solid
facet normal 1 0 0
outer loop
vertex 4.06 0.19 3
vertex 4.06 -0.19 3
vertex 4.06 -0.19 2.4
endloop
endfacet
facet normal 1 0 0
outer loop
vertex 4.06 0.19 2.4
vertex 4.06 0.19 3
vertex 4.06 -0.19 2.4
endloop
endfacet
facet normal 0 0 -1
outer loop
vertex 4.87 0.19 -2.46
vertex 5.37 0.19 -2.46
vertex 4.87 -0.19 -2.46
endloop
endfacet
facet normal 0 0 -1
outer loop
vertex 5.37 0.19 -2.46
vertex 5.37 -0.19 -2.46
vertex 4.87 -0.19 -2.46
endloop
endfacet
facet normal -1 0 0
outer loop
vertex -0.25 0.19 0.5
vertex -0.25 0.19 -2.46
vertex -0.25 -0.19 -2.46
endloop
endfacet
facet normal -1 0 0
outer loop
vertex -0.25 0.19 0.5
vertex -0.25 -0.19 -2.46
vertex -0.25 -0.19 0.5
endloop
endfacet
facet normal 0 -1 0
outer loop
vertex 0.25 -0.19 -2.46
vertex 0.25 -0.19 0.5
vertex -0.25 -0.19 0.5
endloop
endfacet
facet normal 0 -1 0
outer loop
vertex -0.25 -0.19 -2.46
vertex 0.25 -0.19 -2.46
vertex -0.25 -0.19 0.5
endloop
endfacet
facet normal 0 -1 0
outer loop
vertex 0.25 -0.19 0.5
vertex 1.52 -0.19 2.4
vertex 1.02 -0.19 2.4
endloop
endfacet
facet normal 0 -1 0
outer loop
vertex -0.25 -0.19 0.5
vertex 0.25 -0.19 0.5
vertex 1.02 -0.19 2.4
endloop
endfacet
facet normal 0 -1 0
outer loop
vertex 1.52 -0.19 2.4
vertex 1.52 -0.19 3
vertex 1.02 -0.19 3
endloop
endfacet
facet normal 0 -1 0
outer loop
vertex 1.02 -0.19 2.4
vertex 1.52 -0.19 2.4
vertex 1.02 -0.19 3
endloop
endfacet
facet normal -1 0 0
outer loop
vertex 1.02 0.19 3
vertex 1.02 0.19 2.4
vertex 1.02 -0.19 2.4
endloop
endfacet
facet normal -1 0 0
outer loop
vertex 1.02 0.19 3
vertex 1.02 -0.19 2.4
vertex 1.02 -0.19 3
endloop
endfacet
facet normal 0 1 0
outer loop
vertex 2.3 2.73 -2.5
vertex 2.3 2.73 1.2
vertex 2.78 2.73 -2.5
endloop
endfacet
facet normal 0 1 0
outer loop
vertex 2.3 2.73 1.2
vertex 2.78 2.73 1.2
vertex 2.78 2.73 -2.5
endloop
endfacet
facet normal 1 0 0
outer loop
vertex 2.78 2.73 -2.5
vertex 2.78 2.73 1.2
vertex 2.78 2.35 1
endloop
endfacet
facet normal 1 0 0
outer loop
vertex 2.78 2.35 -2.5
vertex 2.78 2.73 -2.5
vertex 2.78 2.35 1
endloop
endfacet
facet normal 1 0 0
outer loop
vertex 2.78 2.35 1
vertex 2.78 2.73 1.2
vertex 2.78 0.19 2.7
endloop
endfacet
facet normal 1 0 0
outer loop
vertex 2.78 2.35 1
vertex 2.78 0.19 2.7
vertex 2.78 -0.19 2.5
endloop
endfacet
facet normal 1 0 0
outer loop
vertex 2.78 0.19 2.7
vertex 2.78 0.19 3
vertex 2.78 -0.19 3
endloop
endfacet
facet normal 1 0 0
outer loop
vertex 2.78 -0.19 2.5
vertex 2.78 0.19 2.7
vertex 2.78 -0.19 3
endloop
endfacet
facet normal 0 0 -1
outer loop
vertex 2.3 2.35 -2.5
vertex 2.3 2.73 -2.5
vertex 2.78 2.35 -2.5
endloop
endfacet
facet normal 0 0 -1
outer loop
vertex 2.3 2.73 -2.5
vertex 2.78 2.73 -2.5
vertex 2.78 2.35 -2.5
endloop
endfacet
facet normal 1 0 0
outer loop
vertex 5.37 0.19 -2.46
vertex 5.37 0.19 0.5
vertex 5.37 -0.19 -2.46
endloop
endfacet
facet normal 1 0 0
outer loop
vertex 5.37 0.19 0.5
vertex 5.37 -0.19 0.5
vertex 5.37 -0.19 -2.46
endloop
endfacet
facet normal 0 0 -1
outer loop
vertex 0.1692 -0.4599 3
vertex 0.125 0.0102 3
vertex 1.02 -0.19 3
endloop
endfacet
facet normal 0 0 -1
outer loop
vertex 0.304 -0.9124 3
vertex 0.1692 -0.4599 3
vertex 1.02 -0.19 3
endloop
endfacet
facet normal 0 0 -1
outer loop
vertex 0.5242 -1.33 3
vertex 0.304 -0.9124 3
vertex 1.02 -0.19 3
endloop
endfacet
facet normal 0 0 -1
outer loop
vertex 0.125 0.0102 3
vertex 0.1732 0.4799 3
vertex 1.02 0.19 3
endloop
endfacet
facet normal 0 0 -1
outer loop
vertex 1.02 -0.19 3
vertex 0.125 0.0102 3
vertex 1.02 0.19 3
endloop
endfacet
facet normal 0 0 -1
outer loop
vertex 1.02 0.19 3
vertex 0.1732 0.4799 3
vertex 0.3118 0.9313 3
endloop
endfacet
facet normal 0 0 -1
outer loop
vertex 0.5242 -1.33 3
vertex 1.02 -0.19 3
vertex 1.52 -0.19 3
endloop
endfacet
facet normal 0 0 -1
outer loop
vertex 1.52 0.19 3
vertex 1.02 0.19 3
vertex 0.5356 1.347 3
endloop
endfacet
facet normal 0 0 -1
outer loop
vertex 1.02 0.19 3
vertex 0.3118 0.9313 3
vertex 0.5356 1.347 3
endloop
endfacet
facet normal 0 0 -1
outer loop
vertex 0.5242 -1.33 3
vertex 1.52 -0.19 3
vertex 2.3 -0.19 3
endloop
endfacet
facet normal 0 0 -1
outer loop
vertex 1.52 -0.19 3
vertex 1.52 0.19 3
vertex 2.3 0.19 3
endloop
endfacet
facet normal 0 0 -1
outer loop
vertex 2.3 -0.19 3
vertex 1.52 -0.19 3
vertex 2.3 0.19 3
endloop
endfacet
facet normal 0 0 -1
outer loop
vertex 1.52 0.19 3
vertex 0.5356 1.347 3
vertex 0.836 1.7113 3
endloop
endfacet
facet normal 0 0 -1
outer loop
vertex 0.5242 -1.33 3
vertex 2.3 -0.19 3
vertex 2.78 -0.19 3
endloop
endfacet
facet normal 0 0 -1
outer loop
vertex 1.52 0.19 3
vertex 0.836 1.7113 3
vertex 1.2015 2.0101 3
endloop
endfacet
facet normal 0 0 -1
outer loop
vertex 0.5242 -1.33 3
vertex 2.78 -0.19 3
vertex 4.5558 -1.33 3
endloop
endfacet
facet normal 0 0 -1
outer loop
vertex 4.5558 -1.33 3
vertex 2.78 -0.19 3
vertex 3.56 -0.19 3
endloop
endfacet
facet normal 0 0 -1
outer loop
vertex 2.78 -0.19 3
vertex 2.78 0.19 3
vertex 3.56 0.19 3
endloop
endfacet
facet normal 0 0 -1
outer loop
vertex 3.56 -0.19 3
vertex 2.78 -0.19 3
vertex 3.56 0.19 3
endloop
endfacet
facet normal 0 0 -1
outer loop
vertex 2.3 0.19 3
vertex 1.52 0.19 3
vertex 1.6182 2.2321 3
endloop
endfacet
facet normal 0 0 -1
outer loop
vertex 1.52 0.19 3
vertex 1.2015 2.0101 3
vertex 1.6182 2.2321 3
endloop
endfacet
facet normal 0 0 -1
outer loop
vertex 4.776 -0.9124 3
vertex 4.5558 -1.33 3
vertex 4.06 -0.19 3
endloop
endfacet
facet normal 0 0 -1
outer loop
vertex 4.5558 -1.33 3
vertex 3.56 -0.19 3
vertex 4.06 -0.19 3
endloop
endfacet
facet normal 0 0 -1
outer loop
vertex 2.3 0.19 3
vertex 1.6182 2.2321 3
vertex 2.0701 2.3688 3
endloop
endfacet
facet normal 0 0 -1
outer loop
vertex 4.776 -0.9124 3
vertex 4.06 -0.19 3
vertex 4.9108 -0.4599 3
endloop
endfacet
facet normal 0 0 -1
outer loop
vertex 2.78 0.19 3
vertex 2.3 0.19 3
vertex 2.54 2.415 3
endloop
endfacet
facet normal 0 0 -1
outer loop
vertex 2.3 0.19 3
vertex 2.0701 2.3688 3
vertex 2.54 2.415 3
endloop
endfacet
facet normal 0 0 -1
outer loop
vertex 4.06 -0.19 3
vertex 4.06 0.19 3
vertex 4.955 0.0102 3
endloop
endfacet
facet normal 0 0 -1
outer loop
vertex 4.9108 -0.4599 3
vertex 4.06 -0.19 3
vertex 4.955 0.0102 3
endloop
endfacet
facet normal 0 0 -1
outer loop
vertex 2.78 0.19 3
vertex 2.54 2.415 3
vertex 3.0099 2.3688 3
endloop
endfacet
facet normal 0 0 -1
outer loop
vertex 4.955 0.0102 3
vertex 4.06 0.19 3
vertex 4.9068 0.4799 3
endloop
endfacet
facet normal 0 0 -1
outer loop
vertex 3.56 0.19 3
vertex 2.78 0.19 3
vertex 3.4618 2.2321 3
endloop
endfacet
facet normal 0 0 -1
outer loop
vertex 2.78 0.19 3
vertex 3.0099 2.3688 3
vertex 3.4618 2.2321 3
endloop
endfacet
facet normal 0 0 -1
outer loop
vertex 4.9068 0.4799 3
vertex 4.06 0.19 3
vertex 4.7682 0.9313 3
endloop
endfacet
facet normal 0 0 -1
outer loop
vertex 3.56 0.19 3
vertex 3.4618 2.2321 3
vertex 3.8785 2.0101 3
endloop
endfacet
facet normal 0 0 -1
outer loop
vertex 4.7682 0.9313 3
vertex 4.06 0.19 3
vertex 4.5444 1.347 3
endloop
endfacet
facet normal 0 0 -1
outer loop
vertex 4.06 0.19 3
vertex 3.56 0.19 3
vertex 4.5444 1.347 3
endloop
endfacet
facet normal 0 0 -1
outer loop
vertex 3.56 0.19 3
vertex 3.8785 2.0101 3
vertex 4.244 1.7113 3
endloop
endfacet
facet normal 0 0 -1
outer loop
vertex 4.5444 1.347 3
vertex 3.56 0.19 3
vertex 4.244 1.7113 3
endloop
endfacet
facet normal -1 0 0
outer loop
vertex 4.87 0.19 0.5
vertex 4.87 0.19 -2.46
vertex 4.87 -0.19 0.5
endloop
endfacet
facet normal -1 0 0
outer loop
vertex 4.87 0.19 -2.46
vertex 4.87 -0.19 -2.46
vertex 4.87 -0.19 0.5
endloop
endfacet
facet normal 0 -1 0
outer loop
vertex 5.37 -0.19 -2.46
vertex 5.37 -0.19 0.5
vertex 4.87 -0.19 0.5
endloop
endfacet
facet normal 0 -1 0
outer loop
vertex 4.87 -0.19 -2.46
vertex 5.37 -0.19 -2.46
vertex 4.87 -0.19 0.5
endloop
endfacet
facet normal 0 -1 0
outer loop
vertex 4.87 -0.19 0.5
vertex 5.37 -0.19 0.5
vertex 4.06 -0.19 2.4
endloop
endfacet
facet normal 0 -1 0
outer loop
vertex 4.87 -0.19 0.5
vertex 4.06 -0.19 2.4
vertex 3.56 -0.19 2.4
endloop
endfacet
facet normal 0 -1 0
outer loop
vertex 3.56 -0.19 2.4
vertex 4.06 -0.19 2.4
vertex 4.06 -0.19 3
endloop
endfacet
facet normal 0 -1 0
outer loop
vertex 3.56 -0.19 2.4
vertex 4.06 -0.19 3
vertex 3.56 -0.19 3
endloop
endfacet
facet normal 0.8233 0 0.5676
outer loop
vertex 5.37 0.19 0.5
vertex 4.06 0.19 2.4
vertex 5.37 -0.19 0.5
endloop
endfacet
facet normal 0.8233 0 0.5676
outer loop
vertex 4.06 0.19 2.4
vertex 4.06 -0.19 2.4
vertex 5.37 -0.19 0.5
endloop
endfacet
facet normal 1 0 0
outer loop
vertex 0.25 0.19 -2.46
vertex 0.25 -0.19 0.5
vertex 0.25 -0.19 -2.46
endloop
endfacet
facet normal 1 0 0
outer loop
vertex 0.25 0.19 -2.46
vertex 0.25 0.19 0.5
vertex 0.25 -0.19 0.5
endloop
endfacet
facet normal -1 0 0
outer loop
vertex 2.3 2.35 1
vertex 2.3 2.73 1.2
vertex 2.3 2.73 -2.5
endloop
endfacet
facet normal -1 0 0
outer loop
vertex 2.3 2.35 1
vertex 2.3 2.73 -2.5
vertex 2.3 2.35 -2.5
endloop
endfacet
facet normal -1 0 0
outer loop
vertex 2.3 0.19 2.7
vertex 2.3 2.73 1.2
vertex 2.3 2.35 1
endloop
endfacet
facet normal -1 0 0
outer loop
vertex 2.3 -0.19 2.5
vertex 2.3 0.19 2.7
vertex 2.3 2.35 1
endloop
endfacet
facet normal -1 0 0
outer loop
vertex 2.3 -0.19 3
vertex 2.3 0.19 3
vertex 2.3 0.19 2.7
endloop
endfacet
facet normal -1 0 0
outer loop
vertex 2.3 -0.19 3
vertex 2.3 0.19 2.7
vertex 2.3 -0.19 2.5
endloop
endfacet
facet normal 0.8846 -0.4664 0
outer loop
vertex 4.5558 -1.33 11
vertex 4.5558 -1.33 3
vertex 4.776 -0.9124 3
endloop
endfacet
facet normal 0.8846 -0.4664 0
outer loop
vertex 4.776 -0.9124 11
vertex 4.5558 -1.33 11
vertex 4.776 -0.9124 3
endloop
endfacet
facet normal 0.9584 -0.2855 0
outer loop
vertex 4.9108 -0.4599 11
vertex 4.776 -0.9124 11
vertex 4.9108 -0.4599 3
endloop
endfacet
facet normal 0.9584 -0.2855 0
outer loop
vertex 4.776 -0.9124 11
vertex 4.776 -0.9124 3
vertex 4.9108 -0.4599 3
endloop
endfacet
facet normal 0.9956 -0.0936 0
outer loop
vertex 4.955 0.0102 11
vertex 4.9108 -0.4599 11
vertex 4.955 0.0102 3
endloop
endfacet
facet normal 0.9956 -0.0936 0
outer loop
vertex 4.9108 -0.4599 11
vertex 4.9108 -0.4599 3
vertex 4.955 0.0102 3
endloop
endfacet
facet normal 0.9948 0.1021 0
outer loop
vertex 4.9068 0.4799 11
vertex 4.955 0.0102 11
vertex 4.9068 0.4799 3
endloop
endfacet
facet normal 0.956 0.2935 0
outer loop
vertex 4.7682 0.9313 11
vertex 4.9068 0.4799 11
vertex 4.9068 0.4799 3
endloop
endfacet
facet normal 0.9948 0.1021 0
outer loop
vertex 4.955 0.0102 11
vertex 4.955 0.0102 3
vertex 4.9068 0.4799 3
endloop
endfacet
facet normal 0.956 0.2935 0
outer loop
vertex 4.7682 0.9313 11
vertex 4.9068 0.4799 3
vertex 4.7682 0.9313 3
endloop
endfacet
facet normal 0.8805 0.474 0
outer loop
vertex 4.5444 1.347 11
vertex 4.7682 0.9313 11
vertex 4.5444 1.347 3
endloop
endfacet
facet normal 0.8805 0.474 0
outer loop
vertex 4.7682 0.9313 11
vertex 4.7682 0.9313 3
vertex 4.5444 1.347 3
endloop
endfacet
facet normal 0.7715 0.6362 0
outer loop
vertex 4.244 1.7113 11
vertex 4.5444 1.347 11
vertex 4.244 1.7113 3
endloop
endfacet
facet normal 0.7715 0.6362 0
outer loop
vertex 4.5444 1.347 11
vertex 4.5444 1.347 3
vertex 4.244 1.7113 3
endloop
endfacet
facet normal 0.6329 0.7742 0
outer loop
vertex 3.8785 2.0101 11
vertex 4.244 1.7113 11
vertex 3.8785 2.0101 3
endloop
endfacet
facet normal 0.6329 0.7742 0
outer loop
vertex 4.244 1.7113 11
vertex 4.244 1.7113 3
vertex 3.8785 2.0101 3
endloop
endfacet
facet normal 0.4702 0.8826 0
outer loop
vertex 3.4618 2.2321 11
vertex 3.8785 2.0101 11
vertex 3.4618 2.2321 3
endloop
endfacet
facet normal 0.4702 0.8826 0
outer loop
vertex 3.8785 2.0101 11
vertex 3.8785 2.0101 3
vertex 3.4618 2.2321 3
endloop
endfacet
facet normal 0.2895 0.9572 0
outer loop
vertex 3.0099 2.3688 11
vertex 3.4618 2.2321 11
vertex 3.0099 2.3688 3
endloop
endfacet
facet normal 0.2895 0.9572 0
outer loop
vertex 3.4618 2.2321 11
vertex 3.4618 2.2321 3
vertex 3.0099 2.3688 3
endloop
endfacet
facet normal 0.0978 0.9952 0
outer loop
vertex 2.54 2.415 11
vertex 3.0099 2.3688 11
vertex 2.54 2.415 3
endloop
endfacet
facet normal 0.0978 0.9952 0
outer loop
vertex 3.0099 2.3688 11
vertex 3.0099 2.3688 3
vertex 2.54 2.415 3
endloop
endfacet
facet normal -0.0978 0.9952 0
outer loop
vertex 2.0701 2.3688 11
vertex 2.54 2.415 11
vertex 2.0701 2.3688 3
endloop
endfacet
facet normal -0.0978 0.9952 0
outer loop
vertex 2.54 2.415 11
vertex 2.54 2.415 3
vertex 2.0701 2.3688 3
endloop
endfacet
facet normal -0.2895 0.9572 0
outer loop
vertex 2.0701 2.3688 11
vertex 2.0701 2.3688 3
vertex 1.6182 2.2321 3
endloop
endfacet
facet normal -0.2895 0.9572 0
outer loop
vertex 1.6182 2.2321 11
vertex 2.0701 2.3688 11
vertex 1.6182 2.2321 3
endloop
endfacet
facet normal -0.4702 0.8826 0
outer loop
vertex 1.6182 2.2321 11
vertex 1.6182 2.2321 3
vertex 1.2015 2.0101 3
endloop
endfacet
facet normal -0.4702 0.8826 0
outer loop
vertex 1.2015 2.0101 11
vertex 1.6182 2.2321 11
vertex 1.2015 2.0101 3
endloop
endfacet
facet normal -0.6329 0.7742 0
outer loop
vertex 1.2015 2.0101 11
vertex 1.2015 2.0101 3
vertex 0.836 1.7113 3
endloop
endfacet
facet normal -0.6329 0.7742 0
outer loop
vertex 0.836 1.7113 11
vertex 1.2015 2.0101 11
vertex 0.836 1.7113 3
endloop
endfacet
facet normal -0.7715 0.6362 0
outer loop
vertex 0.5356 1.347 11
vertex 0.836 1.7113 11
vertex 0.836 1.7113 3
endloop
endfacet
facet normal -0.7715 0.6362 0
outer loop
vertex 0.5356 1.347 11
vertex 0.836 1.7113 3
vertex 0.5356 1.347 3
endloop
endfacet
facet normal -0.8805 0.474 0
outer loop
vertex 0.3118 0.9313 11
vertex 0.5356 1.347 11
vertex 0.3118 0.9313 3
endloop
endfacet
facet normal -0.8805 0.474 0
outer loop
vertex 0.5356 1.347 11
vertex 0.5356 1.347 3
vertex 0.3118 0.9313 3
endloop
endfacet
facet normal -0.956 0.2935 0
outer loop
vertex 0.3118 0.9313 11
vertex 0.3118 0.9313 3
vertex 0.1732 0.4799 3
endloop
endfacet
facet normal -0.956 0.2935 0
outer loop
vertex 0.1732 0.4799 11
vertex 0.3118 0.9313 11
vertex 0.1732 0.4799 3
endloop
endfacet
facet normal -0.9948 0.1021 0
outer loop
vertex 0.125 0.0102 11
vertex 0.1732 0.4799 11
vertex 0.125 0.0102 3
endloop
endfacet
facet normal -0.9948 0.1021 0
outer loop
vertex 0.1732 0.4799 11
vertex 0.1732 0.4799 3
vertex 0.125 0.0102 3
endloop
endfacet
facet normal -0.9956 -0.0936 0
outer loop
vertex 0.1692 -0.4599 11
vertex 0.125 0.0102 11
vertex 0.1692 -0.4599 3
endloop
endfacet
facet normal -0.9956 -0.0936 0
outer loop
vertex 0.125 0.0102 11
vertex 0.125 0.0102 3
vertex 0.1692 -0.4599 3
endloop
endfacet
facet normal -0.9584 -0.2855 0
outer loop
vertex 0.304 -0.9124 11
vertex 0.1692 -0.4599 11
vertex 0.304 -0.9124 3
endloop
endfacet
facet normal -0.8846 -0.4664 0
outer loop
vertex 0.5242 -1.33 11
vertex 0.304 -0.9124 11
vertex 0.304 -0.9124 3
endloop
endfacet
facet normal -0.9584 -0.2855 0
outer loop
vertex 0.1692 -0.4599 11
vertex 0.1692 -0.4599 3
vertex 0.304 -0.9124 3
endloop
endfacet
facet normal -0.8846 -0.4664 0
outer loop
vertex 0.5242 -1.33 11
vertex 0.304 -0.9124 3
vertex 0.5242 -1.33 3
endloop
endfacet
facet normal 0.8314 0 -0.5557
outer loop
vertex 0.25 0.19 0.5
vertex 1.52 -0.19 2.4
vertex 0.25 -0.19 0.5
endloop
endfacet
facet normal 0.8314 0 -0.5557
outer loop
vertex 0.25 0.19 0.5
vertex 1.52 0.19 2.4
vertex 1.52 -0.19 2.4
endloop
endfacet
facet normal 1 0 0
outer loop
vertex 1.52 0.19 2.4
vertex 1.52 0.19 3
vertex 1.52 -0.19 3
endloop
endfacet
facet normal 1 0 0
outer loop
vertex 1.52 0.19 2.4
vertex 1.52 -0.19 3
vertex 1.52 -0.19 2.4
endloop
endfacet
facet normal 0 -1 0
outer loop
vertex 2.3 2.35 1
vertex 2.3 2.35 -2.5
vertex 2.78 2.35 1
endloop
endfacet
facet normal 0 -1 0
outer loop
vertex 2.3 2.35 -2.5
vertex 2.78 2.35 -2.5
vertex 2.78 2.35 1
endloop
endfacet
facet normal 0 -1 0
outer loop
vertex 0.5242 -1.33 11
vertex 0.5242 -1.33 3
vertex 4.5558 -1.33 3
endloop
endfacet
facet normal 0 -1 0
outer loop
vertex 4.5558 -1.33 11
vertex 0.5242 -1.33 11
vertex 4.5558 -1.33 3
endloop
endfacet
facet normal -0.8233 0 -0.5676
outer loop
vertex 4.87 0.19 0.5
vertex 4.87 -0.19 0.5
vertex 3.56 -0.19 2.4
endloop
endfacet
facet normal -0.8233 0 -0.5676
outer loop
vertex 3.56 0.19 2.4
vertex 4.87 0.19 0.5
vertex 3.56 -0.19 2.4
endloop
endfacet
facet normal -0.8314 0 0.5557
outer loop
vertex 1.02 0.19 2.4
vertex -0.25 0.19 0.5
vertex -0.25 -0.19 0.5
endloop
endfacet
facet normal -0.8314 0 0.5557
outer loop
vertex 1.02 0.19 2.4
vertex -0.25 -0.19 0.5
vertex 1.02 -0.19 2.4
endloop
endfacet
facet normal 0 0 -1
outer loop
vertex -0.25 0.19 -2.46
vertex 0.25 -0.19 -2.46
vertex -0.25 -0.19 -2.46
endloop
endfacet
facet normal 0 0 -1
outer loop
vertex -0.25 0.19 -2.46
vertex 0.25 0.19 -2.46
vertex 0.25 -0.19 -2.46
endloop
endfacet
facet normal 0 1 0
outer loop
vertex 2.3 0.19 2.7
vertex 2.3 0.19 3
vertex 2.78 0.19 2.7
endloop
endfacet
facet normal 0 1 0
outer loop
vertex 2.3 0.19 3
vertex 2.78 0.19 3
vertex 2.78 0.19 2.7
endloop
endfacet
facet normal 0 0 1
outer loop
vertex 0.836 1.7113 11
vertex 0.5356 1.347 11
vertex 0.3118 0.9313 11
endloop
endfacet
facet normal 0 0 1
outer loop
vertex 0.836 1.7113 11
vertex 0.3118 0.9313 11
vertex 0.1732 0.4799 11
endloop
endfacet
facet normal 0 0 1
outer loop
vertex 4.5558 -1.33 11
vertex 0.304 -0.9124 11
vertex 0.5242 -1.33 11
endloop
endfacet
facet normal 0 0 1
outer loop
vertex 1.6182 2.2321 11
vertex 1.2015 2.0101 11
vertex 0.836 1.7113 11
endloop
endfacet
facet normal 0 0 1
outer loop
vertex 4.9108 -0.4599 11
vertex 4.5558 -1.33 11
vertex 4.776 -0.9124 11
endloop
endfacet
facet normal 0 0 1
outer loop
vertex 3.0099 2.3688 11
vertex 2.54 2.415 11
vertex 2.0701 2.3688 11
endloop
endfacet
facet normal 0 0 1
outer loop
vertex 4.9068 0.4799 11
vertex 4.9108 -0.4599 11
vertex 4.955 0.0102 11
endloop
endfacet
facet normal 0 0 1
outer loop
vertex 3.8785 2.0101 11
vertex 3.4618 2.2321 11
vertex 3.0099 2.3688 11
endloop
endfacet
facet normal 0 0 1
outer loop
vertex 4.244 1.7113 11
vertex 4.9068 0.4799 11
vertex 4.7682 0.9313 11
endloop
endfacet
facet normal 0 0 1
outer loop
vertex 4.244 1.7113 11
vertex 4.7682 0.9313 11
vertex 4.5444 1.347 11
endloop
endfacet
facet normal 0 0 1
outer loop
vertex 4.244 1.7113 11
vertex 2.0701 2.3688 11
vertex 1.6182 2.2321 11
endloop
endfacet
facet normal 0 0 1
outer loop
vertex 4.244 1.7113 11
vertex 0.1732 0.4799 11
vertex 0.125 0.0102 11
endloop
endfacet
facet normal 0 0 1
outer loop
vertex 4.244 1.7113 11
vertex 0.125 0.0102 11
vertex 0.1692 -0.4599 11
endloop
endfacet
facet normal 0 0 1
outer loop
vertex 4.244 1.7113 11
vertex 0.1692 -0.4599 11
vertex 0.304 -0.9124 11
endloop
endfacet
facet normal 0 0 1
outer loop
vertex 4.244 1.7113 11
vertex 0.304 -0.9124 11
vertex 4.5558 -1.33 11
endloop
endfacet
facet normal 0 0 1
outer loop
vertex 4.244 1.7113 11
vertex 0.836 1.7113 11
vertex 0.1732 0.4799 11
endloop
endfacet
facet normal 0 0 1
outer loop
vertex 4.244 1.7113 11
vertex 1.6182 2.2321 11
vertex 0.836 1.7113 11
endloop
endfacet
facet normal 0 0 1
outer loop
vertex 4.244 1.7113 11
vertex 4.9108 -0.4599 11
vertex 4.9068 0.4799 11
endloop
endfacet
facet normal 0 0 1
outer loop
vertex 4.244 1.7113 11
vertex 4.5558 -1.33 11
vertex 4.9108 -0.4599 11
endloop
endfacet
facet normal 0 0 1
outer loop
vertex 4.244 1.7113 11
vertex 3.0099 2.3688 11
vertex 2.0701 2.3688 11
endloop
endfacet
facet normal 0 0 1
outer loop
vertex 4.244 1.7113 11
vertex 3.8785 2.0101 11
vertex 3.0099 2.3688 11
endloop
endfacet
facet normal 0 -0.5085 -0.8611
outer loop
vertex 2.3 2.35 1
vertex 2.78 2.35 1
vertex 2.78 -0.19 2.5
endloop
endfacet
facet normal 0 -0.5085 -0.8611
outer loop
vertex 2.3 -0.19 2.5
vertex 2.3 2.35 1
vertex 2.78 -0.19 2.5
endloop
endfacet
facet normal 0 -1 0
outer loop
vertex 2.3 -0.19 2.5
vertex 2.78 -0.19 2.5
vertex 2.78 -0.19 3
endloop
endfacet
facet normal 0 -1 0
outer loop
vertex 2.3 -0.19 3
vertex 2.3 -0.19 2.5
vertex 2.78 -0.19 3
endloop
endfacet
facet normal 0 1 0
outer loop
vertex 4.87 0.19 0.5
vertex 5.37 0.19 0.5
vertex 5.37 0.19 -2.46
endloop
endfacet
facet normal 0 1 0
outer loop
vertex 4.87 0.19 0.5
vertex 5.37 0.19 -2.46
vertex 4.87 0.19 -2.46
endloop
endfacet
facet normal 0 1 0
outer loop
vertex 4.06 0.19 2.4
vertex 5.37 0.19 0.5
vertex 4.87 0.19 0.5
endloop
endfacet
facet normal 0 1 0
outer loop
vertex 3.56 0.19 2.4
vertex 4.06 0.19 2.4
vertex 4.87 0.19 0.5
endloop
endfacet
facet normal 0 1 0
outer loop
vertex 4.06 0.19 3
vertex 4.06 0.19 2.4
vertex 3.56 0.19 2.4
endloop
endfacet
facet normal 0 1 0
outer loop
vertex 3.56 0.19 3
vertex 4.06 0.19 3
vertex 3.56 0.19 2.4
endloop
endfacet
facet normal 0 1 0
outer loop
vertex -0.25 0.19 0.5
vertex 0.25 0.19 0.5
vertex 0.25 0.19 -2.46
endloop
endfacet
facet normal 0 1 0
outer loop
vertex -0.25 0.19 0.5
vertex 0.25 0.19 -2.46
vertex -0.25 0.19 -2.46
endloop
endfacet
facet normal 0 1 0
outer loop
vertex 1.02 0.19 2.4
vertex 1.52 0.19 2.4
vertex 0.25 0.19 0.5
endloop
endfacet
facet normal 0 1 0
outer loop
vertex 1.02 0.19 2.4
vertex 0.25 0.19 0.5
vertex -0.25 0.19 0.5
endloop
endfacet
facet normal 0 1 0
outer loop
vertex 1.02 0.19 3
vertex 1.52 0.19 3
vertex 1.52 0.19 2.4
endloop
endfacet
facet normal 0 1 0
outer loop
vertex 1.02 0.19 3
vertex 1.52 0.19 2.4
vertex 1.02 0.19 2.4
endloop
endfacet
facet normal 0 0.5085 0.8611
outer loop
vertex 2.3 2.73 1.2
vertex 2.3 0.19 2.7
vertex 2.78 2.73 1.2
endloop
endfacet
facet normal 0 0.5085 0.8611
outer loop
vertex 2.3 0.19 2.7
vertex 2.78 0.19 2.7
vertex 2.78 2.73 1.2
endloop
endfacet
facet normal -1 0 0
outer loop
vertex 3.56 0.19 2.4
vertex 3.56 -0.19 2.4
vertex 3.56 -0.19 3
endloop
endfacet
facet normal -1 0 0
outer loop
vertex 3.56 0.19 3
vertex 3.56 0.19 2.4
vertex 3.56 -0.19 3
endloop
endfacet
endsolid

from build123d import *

# Parameters (mm, degrees)
PAD001_DEPTH = 0.19
PAD_DEPTH    = 8
PAD002_DEPTH = 0.24


with BuildPart() as pad001:
    # Sketch001 → Pad001 (new body, symmetric)
    with BuildSketch(Plane.XZ):
        Polygon((0.25, -2.46), (-0.25, -2.46), (-0.25, 0.5), (1.02, 2.4), (1.02, 3.04), (1.52, 3.04), (1.52, 2.4), (0.25, 0.5), align=None)
        Polygon((3.56, 3.04), (4.06, 3.04), (4.06, 2.4), (5.37, 0.5), (5.37, -2.46), (4.87, -2.46), (4.87, 0.5), (3.56, 2.4), align=None)
    extrude(amount=PAD001_DEPTH, both=True)


with BuildPart() as pad:
    # Sketch → Pad (new body)
    with BuildSketch(Plane.XY.offset(3)):
        with BuildLine():
            Line((0.524231, -1.33), (4.555769, -1.33))
            ThreePointArc((4.555769, -1.33), (2.54, 2.415), (0.524231, -1.33))
        make_face()
    extrude(amount=PAD_DEPTH)


with BuildPart() as to_92_wide:
    # Sketch002 → Pad002 (new body, symmetric)
    with BuildSketch(Plane.YZ.offset(2.54)):
        Polygon((-0.19, 3), (0.19, 3), (0.19, 2.7), (2.73, 1.2), (2.73, -2.5), (2.35, -2.5), (2.35, 1), (-0.19, 2.5), align=None)
    extrude(amount=PAD002_DEPTH, both=True)

    # Pad002_mp_cp: union Pad001, Pad
    add(pad001.part)
    add(pad.part)


solid = to_92_wide.part
